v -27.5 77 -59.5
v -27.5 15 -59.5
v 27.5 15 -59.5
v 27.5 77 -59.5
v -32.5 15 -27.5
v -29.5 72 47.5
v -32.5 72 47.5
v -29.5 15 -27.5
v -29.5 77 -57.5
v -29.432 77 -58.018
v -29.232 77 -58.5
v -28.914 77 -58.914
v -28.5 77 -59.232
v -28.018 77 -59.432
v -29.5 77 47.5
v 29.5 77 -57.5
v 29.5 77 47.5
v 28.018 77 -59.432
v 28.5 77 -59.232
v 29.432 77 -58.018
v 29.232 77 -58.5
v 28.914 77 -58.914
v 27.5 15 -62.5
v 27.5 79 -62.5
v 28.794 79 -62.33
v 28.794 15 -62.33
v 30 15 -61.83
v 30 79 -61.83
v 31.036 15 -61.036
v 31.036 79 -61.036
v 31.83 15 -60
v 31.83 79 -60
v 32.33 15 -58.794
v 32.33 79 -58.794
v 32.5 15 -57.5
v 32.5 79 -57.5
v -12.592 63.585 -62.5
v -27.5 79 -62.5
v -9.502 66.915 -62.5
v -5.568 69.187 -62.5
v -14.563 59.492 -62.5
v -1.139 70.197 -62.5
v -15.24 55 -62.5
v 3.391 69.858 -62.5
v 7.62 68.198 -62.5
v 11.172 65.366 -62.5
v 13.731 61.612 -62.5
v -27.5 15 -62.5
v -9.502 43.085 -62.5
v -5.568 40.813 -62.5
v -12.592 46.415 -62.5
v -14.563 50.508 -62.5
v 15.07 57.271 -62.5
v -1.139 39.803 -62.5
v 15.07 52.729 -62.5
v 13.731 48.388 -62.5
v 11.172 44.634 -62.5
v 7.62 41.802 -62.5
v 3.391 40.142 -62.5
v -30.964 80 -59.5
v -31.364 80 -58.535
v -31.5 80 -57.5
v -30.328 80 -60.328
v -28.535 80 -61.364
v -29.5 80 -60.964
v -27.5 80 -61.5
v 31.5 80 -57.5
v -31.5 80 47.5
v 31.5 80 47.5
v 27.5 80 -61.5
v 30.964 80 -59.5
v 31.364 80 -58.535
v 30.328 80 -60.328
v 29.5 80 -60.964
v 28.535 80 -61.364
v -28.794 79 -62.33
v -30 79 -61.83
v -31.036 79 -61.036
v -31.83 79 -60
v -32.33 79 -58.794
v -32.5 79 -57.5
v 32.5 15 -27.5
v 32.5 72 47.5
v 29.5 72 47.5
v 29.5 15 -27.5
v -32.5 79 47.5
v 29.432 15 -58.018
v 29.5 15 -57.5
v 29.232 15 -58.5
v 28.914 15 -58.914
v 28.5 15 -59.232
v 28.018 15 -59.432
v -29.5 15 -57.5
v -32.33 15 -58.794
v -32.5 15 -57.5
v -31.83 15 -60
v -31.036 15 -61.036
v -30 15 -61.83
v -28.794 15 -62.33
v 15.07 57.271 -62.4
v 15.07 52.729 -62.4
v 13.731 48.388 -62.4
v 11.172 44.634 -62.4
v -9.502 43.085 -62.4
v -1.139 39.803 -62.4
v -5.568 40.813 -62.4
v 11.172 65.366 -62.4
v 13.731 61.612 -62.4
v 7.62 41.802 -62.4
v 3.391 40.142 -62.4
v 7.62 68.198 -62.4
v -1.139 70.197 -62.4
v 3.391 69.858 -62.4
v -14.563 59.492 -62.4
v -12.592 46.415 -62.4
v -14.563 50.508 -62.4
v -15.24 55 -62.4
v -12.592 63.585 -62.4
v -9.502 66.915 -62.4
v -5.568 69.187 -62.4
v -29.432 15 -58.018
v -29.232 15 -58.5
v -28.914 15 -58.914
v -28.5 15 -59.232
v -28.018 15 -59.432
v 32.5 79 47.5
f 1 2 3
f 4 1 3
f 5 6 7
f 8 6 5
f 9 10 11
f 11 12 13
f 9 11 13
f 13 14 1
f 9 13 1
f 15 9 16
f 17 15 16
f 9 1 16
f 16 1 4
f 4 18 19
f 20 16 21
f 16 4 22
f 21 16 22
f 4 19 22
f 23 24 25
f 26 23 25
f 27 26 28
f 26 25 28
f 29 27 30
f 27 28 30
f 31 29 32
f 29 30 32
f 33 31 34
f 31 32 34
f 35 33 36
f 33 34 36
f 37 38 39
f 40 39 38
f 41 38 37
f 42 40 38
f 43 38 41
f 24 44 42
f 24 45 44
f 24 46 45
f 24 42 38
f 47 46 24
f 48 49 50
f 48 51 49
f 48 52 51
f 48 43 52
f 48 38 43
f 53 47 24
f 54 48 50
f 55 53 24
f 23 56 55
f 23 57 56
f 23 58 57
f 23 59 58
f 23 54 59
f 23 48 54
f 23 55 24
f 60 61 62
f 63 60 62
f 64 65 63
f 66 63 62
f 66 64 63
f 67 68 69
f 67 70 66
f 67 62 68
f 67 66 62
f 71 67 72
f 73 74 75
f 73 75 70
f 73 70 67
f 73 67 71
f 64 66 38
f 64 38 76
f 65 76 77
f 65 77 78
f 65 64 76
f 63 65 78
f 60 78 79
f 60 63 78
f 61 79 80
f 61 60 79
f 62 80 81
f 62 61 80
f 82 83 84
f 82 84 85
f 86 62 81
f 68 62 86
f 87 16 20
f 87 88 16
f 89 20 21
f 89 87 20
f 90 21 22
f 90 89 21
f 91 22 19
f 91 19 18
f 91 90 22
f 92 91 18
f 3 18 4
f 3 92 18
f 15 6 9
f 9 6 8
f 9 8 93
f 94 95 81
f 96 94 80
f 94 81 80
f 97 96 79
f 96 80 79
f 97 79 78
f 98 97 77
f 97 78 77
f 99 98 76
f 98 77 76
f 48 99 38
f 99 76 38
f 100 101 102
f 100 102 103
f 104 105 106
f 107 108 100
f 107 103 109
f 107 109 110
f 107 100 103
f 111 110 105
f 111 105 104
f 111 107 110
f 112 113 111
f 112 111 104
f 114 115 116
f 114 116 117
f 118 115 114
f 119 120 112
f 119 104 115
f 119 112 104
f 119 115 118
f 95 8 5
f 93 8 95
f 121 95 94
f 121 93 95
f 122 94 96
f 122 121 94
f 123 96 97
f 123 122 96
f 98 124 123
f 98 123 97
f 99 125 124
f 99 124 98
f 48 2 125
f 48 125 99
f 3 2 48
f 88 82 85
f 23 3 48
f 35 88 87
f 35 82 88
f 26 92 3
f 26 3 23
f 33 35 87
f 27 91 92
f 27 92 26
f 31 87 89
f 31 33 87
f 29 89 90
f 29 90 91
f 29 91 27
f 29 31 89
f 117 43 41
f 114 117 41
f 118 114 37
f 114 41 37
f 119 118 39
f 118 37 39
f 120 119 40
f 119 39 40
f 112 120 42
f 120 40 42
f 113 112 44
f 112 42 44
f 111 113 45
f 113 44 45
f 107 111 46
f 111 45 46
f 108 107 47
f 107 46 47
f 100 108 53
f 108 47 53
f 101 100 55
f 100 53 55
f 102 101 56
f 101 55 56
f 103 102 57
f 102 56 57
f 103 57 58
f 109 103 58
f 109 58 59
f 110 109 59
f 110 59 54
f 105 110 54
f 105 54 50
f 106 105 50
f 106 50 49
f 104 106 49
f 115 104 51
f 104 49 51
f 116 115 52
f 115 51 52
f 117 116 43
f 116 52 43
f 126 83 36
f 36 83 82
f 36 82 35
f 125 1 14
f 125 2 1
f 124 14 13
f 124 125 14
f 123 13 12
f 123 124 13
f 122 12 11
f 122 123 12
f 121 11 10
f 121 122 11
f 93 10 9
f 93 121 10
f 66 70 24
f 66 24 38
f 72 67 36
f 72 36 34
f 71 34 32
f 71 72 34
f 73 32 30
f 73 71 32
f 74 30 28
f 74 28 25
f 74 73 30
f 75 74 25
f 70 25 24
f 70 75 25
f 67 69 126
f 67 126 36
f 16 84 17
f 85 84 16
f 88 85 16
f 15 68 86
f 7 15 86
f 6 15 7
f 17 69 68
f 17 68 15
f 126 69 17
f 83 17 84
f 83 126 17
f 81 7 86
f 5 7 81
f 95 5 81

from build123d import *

# Parameters (mm, degrees)
ESQUISSE1_W             = 65
ESQUISSE1_H             = 125
BOSS_EXTRU_1_DEPTH      = 80
COQUE1_T                = -3
ESQUISSE2_OUTSIDE_W     = 159.404
ESQUISSE2_OUTSIDE_H     = 114.404
ENL_V_MAT_EXTRU_1_DEPTH = 66
CONG_2_R                = 5
CONG_3_R                = 2
CHANFREIN1_SIZE         = 1
ESQUISSE3_R             = 15.24
ENL_V_MAT_EXTRU_2_DEPTH = 0.1


with BuildPart() as part:
    # Esquisse1 → Boss.-Extru.1 (new body)
    with BuildSketch(Plane(origin=(0, 0, 0), x_dir=(1, 0, 0), z_dir=(0, 1, 0))):
        Rectangle(ESQUISSE1_W, ESQUISSE1_H)
    extrude(amount=BOSS_EXTRU_1_DEPTH)

    # Coque1
    coque1_openings = [part.faces().sort_by_distance(p)[0] for p in [
        (0, 0, 0),
    ]]
    offset(amount=COQUE1_T, openings=coque1_openings, kind=Kind.INTERSECTION)

    # Esquisse2 outside → Enlèv. mat.-Extru.1 (cut, through all)
    with BuildSketch(Plane(origin=(32.5, 0, 0), x_dir=(0, 0, -1), z_dir=(1, 0, 0))):
        with Locations((0, 40)):
            Rectangle(ESQUISSE2_OUTSIDE_W, ESQUISSE2_OUTSIDE_H)
        Polygon((-47.5, 80), (-47.5, 72), (27.5, 15), (62.5, 15), (62.5, 80), align=None, mode=Mode.SUBTRACT)
    extrude(amount=-ENL_V_MAT_EXTRU_1_DEPTH, mode=Mode.SUBTRACT)

    # Congé2
    cong_2_edges = [part.edges().sort_by_distance(p)[0] for p in [
        (-32.5, 47.5, -62.5),
        (32.5, 47.5, -62.5),
    ]]
    fillet(cong_2_edges, radius=CONG_2_R)

    # Congé3
    cong_3_edges = [part.edges().sort_by_distance(p)[0] for p in [
        (29.5, 46, -59.5),
        (-29.5, 46, -59.5),
    ]]
    fillet(cong_3_edges, radius=CONG_3_R)

    # Chanfrein1
    chanfrein1_edges = [part.edges().sort_by_distance(p)[0] for p in [
        (32.5, 80, -5),
        (-32.5, 80, -5),
        (0, 80, -62.5),
        (31.035533906, 80, -61.035533906),
        (-31.035533906, 80, -61.035533906),
    ]]
    chamfer(chanfrein1_edges, length=CHANFREIN1_SIZE)

    # Esquisse3 → Enlèv. mat.-Extru.2 (cut)
    with BuildSketch(Plane(origin=(0, 0, -62.5), x_dir=(-1, 0, 0), z_dir=(0, 0, -1))):
        with Locations((0, 55)):
            Circle(ESQUISSE3_R)
    extrude(amount=-ENL_V_MAT_EXTRU_2_DEPTH, mode=Mode.SUBTRACT)


solid = part.part
